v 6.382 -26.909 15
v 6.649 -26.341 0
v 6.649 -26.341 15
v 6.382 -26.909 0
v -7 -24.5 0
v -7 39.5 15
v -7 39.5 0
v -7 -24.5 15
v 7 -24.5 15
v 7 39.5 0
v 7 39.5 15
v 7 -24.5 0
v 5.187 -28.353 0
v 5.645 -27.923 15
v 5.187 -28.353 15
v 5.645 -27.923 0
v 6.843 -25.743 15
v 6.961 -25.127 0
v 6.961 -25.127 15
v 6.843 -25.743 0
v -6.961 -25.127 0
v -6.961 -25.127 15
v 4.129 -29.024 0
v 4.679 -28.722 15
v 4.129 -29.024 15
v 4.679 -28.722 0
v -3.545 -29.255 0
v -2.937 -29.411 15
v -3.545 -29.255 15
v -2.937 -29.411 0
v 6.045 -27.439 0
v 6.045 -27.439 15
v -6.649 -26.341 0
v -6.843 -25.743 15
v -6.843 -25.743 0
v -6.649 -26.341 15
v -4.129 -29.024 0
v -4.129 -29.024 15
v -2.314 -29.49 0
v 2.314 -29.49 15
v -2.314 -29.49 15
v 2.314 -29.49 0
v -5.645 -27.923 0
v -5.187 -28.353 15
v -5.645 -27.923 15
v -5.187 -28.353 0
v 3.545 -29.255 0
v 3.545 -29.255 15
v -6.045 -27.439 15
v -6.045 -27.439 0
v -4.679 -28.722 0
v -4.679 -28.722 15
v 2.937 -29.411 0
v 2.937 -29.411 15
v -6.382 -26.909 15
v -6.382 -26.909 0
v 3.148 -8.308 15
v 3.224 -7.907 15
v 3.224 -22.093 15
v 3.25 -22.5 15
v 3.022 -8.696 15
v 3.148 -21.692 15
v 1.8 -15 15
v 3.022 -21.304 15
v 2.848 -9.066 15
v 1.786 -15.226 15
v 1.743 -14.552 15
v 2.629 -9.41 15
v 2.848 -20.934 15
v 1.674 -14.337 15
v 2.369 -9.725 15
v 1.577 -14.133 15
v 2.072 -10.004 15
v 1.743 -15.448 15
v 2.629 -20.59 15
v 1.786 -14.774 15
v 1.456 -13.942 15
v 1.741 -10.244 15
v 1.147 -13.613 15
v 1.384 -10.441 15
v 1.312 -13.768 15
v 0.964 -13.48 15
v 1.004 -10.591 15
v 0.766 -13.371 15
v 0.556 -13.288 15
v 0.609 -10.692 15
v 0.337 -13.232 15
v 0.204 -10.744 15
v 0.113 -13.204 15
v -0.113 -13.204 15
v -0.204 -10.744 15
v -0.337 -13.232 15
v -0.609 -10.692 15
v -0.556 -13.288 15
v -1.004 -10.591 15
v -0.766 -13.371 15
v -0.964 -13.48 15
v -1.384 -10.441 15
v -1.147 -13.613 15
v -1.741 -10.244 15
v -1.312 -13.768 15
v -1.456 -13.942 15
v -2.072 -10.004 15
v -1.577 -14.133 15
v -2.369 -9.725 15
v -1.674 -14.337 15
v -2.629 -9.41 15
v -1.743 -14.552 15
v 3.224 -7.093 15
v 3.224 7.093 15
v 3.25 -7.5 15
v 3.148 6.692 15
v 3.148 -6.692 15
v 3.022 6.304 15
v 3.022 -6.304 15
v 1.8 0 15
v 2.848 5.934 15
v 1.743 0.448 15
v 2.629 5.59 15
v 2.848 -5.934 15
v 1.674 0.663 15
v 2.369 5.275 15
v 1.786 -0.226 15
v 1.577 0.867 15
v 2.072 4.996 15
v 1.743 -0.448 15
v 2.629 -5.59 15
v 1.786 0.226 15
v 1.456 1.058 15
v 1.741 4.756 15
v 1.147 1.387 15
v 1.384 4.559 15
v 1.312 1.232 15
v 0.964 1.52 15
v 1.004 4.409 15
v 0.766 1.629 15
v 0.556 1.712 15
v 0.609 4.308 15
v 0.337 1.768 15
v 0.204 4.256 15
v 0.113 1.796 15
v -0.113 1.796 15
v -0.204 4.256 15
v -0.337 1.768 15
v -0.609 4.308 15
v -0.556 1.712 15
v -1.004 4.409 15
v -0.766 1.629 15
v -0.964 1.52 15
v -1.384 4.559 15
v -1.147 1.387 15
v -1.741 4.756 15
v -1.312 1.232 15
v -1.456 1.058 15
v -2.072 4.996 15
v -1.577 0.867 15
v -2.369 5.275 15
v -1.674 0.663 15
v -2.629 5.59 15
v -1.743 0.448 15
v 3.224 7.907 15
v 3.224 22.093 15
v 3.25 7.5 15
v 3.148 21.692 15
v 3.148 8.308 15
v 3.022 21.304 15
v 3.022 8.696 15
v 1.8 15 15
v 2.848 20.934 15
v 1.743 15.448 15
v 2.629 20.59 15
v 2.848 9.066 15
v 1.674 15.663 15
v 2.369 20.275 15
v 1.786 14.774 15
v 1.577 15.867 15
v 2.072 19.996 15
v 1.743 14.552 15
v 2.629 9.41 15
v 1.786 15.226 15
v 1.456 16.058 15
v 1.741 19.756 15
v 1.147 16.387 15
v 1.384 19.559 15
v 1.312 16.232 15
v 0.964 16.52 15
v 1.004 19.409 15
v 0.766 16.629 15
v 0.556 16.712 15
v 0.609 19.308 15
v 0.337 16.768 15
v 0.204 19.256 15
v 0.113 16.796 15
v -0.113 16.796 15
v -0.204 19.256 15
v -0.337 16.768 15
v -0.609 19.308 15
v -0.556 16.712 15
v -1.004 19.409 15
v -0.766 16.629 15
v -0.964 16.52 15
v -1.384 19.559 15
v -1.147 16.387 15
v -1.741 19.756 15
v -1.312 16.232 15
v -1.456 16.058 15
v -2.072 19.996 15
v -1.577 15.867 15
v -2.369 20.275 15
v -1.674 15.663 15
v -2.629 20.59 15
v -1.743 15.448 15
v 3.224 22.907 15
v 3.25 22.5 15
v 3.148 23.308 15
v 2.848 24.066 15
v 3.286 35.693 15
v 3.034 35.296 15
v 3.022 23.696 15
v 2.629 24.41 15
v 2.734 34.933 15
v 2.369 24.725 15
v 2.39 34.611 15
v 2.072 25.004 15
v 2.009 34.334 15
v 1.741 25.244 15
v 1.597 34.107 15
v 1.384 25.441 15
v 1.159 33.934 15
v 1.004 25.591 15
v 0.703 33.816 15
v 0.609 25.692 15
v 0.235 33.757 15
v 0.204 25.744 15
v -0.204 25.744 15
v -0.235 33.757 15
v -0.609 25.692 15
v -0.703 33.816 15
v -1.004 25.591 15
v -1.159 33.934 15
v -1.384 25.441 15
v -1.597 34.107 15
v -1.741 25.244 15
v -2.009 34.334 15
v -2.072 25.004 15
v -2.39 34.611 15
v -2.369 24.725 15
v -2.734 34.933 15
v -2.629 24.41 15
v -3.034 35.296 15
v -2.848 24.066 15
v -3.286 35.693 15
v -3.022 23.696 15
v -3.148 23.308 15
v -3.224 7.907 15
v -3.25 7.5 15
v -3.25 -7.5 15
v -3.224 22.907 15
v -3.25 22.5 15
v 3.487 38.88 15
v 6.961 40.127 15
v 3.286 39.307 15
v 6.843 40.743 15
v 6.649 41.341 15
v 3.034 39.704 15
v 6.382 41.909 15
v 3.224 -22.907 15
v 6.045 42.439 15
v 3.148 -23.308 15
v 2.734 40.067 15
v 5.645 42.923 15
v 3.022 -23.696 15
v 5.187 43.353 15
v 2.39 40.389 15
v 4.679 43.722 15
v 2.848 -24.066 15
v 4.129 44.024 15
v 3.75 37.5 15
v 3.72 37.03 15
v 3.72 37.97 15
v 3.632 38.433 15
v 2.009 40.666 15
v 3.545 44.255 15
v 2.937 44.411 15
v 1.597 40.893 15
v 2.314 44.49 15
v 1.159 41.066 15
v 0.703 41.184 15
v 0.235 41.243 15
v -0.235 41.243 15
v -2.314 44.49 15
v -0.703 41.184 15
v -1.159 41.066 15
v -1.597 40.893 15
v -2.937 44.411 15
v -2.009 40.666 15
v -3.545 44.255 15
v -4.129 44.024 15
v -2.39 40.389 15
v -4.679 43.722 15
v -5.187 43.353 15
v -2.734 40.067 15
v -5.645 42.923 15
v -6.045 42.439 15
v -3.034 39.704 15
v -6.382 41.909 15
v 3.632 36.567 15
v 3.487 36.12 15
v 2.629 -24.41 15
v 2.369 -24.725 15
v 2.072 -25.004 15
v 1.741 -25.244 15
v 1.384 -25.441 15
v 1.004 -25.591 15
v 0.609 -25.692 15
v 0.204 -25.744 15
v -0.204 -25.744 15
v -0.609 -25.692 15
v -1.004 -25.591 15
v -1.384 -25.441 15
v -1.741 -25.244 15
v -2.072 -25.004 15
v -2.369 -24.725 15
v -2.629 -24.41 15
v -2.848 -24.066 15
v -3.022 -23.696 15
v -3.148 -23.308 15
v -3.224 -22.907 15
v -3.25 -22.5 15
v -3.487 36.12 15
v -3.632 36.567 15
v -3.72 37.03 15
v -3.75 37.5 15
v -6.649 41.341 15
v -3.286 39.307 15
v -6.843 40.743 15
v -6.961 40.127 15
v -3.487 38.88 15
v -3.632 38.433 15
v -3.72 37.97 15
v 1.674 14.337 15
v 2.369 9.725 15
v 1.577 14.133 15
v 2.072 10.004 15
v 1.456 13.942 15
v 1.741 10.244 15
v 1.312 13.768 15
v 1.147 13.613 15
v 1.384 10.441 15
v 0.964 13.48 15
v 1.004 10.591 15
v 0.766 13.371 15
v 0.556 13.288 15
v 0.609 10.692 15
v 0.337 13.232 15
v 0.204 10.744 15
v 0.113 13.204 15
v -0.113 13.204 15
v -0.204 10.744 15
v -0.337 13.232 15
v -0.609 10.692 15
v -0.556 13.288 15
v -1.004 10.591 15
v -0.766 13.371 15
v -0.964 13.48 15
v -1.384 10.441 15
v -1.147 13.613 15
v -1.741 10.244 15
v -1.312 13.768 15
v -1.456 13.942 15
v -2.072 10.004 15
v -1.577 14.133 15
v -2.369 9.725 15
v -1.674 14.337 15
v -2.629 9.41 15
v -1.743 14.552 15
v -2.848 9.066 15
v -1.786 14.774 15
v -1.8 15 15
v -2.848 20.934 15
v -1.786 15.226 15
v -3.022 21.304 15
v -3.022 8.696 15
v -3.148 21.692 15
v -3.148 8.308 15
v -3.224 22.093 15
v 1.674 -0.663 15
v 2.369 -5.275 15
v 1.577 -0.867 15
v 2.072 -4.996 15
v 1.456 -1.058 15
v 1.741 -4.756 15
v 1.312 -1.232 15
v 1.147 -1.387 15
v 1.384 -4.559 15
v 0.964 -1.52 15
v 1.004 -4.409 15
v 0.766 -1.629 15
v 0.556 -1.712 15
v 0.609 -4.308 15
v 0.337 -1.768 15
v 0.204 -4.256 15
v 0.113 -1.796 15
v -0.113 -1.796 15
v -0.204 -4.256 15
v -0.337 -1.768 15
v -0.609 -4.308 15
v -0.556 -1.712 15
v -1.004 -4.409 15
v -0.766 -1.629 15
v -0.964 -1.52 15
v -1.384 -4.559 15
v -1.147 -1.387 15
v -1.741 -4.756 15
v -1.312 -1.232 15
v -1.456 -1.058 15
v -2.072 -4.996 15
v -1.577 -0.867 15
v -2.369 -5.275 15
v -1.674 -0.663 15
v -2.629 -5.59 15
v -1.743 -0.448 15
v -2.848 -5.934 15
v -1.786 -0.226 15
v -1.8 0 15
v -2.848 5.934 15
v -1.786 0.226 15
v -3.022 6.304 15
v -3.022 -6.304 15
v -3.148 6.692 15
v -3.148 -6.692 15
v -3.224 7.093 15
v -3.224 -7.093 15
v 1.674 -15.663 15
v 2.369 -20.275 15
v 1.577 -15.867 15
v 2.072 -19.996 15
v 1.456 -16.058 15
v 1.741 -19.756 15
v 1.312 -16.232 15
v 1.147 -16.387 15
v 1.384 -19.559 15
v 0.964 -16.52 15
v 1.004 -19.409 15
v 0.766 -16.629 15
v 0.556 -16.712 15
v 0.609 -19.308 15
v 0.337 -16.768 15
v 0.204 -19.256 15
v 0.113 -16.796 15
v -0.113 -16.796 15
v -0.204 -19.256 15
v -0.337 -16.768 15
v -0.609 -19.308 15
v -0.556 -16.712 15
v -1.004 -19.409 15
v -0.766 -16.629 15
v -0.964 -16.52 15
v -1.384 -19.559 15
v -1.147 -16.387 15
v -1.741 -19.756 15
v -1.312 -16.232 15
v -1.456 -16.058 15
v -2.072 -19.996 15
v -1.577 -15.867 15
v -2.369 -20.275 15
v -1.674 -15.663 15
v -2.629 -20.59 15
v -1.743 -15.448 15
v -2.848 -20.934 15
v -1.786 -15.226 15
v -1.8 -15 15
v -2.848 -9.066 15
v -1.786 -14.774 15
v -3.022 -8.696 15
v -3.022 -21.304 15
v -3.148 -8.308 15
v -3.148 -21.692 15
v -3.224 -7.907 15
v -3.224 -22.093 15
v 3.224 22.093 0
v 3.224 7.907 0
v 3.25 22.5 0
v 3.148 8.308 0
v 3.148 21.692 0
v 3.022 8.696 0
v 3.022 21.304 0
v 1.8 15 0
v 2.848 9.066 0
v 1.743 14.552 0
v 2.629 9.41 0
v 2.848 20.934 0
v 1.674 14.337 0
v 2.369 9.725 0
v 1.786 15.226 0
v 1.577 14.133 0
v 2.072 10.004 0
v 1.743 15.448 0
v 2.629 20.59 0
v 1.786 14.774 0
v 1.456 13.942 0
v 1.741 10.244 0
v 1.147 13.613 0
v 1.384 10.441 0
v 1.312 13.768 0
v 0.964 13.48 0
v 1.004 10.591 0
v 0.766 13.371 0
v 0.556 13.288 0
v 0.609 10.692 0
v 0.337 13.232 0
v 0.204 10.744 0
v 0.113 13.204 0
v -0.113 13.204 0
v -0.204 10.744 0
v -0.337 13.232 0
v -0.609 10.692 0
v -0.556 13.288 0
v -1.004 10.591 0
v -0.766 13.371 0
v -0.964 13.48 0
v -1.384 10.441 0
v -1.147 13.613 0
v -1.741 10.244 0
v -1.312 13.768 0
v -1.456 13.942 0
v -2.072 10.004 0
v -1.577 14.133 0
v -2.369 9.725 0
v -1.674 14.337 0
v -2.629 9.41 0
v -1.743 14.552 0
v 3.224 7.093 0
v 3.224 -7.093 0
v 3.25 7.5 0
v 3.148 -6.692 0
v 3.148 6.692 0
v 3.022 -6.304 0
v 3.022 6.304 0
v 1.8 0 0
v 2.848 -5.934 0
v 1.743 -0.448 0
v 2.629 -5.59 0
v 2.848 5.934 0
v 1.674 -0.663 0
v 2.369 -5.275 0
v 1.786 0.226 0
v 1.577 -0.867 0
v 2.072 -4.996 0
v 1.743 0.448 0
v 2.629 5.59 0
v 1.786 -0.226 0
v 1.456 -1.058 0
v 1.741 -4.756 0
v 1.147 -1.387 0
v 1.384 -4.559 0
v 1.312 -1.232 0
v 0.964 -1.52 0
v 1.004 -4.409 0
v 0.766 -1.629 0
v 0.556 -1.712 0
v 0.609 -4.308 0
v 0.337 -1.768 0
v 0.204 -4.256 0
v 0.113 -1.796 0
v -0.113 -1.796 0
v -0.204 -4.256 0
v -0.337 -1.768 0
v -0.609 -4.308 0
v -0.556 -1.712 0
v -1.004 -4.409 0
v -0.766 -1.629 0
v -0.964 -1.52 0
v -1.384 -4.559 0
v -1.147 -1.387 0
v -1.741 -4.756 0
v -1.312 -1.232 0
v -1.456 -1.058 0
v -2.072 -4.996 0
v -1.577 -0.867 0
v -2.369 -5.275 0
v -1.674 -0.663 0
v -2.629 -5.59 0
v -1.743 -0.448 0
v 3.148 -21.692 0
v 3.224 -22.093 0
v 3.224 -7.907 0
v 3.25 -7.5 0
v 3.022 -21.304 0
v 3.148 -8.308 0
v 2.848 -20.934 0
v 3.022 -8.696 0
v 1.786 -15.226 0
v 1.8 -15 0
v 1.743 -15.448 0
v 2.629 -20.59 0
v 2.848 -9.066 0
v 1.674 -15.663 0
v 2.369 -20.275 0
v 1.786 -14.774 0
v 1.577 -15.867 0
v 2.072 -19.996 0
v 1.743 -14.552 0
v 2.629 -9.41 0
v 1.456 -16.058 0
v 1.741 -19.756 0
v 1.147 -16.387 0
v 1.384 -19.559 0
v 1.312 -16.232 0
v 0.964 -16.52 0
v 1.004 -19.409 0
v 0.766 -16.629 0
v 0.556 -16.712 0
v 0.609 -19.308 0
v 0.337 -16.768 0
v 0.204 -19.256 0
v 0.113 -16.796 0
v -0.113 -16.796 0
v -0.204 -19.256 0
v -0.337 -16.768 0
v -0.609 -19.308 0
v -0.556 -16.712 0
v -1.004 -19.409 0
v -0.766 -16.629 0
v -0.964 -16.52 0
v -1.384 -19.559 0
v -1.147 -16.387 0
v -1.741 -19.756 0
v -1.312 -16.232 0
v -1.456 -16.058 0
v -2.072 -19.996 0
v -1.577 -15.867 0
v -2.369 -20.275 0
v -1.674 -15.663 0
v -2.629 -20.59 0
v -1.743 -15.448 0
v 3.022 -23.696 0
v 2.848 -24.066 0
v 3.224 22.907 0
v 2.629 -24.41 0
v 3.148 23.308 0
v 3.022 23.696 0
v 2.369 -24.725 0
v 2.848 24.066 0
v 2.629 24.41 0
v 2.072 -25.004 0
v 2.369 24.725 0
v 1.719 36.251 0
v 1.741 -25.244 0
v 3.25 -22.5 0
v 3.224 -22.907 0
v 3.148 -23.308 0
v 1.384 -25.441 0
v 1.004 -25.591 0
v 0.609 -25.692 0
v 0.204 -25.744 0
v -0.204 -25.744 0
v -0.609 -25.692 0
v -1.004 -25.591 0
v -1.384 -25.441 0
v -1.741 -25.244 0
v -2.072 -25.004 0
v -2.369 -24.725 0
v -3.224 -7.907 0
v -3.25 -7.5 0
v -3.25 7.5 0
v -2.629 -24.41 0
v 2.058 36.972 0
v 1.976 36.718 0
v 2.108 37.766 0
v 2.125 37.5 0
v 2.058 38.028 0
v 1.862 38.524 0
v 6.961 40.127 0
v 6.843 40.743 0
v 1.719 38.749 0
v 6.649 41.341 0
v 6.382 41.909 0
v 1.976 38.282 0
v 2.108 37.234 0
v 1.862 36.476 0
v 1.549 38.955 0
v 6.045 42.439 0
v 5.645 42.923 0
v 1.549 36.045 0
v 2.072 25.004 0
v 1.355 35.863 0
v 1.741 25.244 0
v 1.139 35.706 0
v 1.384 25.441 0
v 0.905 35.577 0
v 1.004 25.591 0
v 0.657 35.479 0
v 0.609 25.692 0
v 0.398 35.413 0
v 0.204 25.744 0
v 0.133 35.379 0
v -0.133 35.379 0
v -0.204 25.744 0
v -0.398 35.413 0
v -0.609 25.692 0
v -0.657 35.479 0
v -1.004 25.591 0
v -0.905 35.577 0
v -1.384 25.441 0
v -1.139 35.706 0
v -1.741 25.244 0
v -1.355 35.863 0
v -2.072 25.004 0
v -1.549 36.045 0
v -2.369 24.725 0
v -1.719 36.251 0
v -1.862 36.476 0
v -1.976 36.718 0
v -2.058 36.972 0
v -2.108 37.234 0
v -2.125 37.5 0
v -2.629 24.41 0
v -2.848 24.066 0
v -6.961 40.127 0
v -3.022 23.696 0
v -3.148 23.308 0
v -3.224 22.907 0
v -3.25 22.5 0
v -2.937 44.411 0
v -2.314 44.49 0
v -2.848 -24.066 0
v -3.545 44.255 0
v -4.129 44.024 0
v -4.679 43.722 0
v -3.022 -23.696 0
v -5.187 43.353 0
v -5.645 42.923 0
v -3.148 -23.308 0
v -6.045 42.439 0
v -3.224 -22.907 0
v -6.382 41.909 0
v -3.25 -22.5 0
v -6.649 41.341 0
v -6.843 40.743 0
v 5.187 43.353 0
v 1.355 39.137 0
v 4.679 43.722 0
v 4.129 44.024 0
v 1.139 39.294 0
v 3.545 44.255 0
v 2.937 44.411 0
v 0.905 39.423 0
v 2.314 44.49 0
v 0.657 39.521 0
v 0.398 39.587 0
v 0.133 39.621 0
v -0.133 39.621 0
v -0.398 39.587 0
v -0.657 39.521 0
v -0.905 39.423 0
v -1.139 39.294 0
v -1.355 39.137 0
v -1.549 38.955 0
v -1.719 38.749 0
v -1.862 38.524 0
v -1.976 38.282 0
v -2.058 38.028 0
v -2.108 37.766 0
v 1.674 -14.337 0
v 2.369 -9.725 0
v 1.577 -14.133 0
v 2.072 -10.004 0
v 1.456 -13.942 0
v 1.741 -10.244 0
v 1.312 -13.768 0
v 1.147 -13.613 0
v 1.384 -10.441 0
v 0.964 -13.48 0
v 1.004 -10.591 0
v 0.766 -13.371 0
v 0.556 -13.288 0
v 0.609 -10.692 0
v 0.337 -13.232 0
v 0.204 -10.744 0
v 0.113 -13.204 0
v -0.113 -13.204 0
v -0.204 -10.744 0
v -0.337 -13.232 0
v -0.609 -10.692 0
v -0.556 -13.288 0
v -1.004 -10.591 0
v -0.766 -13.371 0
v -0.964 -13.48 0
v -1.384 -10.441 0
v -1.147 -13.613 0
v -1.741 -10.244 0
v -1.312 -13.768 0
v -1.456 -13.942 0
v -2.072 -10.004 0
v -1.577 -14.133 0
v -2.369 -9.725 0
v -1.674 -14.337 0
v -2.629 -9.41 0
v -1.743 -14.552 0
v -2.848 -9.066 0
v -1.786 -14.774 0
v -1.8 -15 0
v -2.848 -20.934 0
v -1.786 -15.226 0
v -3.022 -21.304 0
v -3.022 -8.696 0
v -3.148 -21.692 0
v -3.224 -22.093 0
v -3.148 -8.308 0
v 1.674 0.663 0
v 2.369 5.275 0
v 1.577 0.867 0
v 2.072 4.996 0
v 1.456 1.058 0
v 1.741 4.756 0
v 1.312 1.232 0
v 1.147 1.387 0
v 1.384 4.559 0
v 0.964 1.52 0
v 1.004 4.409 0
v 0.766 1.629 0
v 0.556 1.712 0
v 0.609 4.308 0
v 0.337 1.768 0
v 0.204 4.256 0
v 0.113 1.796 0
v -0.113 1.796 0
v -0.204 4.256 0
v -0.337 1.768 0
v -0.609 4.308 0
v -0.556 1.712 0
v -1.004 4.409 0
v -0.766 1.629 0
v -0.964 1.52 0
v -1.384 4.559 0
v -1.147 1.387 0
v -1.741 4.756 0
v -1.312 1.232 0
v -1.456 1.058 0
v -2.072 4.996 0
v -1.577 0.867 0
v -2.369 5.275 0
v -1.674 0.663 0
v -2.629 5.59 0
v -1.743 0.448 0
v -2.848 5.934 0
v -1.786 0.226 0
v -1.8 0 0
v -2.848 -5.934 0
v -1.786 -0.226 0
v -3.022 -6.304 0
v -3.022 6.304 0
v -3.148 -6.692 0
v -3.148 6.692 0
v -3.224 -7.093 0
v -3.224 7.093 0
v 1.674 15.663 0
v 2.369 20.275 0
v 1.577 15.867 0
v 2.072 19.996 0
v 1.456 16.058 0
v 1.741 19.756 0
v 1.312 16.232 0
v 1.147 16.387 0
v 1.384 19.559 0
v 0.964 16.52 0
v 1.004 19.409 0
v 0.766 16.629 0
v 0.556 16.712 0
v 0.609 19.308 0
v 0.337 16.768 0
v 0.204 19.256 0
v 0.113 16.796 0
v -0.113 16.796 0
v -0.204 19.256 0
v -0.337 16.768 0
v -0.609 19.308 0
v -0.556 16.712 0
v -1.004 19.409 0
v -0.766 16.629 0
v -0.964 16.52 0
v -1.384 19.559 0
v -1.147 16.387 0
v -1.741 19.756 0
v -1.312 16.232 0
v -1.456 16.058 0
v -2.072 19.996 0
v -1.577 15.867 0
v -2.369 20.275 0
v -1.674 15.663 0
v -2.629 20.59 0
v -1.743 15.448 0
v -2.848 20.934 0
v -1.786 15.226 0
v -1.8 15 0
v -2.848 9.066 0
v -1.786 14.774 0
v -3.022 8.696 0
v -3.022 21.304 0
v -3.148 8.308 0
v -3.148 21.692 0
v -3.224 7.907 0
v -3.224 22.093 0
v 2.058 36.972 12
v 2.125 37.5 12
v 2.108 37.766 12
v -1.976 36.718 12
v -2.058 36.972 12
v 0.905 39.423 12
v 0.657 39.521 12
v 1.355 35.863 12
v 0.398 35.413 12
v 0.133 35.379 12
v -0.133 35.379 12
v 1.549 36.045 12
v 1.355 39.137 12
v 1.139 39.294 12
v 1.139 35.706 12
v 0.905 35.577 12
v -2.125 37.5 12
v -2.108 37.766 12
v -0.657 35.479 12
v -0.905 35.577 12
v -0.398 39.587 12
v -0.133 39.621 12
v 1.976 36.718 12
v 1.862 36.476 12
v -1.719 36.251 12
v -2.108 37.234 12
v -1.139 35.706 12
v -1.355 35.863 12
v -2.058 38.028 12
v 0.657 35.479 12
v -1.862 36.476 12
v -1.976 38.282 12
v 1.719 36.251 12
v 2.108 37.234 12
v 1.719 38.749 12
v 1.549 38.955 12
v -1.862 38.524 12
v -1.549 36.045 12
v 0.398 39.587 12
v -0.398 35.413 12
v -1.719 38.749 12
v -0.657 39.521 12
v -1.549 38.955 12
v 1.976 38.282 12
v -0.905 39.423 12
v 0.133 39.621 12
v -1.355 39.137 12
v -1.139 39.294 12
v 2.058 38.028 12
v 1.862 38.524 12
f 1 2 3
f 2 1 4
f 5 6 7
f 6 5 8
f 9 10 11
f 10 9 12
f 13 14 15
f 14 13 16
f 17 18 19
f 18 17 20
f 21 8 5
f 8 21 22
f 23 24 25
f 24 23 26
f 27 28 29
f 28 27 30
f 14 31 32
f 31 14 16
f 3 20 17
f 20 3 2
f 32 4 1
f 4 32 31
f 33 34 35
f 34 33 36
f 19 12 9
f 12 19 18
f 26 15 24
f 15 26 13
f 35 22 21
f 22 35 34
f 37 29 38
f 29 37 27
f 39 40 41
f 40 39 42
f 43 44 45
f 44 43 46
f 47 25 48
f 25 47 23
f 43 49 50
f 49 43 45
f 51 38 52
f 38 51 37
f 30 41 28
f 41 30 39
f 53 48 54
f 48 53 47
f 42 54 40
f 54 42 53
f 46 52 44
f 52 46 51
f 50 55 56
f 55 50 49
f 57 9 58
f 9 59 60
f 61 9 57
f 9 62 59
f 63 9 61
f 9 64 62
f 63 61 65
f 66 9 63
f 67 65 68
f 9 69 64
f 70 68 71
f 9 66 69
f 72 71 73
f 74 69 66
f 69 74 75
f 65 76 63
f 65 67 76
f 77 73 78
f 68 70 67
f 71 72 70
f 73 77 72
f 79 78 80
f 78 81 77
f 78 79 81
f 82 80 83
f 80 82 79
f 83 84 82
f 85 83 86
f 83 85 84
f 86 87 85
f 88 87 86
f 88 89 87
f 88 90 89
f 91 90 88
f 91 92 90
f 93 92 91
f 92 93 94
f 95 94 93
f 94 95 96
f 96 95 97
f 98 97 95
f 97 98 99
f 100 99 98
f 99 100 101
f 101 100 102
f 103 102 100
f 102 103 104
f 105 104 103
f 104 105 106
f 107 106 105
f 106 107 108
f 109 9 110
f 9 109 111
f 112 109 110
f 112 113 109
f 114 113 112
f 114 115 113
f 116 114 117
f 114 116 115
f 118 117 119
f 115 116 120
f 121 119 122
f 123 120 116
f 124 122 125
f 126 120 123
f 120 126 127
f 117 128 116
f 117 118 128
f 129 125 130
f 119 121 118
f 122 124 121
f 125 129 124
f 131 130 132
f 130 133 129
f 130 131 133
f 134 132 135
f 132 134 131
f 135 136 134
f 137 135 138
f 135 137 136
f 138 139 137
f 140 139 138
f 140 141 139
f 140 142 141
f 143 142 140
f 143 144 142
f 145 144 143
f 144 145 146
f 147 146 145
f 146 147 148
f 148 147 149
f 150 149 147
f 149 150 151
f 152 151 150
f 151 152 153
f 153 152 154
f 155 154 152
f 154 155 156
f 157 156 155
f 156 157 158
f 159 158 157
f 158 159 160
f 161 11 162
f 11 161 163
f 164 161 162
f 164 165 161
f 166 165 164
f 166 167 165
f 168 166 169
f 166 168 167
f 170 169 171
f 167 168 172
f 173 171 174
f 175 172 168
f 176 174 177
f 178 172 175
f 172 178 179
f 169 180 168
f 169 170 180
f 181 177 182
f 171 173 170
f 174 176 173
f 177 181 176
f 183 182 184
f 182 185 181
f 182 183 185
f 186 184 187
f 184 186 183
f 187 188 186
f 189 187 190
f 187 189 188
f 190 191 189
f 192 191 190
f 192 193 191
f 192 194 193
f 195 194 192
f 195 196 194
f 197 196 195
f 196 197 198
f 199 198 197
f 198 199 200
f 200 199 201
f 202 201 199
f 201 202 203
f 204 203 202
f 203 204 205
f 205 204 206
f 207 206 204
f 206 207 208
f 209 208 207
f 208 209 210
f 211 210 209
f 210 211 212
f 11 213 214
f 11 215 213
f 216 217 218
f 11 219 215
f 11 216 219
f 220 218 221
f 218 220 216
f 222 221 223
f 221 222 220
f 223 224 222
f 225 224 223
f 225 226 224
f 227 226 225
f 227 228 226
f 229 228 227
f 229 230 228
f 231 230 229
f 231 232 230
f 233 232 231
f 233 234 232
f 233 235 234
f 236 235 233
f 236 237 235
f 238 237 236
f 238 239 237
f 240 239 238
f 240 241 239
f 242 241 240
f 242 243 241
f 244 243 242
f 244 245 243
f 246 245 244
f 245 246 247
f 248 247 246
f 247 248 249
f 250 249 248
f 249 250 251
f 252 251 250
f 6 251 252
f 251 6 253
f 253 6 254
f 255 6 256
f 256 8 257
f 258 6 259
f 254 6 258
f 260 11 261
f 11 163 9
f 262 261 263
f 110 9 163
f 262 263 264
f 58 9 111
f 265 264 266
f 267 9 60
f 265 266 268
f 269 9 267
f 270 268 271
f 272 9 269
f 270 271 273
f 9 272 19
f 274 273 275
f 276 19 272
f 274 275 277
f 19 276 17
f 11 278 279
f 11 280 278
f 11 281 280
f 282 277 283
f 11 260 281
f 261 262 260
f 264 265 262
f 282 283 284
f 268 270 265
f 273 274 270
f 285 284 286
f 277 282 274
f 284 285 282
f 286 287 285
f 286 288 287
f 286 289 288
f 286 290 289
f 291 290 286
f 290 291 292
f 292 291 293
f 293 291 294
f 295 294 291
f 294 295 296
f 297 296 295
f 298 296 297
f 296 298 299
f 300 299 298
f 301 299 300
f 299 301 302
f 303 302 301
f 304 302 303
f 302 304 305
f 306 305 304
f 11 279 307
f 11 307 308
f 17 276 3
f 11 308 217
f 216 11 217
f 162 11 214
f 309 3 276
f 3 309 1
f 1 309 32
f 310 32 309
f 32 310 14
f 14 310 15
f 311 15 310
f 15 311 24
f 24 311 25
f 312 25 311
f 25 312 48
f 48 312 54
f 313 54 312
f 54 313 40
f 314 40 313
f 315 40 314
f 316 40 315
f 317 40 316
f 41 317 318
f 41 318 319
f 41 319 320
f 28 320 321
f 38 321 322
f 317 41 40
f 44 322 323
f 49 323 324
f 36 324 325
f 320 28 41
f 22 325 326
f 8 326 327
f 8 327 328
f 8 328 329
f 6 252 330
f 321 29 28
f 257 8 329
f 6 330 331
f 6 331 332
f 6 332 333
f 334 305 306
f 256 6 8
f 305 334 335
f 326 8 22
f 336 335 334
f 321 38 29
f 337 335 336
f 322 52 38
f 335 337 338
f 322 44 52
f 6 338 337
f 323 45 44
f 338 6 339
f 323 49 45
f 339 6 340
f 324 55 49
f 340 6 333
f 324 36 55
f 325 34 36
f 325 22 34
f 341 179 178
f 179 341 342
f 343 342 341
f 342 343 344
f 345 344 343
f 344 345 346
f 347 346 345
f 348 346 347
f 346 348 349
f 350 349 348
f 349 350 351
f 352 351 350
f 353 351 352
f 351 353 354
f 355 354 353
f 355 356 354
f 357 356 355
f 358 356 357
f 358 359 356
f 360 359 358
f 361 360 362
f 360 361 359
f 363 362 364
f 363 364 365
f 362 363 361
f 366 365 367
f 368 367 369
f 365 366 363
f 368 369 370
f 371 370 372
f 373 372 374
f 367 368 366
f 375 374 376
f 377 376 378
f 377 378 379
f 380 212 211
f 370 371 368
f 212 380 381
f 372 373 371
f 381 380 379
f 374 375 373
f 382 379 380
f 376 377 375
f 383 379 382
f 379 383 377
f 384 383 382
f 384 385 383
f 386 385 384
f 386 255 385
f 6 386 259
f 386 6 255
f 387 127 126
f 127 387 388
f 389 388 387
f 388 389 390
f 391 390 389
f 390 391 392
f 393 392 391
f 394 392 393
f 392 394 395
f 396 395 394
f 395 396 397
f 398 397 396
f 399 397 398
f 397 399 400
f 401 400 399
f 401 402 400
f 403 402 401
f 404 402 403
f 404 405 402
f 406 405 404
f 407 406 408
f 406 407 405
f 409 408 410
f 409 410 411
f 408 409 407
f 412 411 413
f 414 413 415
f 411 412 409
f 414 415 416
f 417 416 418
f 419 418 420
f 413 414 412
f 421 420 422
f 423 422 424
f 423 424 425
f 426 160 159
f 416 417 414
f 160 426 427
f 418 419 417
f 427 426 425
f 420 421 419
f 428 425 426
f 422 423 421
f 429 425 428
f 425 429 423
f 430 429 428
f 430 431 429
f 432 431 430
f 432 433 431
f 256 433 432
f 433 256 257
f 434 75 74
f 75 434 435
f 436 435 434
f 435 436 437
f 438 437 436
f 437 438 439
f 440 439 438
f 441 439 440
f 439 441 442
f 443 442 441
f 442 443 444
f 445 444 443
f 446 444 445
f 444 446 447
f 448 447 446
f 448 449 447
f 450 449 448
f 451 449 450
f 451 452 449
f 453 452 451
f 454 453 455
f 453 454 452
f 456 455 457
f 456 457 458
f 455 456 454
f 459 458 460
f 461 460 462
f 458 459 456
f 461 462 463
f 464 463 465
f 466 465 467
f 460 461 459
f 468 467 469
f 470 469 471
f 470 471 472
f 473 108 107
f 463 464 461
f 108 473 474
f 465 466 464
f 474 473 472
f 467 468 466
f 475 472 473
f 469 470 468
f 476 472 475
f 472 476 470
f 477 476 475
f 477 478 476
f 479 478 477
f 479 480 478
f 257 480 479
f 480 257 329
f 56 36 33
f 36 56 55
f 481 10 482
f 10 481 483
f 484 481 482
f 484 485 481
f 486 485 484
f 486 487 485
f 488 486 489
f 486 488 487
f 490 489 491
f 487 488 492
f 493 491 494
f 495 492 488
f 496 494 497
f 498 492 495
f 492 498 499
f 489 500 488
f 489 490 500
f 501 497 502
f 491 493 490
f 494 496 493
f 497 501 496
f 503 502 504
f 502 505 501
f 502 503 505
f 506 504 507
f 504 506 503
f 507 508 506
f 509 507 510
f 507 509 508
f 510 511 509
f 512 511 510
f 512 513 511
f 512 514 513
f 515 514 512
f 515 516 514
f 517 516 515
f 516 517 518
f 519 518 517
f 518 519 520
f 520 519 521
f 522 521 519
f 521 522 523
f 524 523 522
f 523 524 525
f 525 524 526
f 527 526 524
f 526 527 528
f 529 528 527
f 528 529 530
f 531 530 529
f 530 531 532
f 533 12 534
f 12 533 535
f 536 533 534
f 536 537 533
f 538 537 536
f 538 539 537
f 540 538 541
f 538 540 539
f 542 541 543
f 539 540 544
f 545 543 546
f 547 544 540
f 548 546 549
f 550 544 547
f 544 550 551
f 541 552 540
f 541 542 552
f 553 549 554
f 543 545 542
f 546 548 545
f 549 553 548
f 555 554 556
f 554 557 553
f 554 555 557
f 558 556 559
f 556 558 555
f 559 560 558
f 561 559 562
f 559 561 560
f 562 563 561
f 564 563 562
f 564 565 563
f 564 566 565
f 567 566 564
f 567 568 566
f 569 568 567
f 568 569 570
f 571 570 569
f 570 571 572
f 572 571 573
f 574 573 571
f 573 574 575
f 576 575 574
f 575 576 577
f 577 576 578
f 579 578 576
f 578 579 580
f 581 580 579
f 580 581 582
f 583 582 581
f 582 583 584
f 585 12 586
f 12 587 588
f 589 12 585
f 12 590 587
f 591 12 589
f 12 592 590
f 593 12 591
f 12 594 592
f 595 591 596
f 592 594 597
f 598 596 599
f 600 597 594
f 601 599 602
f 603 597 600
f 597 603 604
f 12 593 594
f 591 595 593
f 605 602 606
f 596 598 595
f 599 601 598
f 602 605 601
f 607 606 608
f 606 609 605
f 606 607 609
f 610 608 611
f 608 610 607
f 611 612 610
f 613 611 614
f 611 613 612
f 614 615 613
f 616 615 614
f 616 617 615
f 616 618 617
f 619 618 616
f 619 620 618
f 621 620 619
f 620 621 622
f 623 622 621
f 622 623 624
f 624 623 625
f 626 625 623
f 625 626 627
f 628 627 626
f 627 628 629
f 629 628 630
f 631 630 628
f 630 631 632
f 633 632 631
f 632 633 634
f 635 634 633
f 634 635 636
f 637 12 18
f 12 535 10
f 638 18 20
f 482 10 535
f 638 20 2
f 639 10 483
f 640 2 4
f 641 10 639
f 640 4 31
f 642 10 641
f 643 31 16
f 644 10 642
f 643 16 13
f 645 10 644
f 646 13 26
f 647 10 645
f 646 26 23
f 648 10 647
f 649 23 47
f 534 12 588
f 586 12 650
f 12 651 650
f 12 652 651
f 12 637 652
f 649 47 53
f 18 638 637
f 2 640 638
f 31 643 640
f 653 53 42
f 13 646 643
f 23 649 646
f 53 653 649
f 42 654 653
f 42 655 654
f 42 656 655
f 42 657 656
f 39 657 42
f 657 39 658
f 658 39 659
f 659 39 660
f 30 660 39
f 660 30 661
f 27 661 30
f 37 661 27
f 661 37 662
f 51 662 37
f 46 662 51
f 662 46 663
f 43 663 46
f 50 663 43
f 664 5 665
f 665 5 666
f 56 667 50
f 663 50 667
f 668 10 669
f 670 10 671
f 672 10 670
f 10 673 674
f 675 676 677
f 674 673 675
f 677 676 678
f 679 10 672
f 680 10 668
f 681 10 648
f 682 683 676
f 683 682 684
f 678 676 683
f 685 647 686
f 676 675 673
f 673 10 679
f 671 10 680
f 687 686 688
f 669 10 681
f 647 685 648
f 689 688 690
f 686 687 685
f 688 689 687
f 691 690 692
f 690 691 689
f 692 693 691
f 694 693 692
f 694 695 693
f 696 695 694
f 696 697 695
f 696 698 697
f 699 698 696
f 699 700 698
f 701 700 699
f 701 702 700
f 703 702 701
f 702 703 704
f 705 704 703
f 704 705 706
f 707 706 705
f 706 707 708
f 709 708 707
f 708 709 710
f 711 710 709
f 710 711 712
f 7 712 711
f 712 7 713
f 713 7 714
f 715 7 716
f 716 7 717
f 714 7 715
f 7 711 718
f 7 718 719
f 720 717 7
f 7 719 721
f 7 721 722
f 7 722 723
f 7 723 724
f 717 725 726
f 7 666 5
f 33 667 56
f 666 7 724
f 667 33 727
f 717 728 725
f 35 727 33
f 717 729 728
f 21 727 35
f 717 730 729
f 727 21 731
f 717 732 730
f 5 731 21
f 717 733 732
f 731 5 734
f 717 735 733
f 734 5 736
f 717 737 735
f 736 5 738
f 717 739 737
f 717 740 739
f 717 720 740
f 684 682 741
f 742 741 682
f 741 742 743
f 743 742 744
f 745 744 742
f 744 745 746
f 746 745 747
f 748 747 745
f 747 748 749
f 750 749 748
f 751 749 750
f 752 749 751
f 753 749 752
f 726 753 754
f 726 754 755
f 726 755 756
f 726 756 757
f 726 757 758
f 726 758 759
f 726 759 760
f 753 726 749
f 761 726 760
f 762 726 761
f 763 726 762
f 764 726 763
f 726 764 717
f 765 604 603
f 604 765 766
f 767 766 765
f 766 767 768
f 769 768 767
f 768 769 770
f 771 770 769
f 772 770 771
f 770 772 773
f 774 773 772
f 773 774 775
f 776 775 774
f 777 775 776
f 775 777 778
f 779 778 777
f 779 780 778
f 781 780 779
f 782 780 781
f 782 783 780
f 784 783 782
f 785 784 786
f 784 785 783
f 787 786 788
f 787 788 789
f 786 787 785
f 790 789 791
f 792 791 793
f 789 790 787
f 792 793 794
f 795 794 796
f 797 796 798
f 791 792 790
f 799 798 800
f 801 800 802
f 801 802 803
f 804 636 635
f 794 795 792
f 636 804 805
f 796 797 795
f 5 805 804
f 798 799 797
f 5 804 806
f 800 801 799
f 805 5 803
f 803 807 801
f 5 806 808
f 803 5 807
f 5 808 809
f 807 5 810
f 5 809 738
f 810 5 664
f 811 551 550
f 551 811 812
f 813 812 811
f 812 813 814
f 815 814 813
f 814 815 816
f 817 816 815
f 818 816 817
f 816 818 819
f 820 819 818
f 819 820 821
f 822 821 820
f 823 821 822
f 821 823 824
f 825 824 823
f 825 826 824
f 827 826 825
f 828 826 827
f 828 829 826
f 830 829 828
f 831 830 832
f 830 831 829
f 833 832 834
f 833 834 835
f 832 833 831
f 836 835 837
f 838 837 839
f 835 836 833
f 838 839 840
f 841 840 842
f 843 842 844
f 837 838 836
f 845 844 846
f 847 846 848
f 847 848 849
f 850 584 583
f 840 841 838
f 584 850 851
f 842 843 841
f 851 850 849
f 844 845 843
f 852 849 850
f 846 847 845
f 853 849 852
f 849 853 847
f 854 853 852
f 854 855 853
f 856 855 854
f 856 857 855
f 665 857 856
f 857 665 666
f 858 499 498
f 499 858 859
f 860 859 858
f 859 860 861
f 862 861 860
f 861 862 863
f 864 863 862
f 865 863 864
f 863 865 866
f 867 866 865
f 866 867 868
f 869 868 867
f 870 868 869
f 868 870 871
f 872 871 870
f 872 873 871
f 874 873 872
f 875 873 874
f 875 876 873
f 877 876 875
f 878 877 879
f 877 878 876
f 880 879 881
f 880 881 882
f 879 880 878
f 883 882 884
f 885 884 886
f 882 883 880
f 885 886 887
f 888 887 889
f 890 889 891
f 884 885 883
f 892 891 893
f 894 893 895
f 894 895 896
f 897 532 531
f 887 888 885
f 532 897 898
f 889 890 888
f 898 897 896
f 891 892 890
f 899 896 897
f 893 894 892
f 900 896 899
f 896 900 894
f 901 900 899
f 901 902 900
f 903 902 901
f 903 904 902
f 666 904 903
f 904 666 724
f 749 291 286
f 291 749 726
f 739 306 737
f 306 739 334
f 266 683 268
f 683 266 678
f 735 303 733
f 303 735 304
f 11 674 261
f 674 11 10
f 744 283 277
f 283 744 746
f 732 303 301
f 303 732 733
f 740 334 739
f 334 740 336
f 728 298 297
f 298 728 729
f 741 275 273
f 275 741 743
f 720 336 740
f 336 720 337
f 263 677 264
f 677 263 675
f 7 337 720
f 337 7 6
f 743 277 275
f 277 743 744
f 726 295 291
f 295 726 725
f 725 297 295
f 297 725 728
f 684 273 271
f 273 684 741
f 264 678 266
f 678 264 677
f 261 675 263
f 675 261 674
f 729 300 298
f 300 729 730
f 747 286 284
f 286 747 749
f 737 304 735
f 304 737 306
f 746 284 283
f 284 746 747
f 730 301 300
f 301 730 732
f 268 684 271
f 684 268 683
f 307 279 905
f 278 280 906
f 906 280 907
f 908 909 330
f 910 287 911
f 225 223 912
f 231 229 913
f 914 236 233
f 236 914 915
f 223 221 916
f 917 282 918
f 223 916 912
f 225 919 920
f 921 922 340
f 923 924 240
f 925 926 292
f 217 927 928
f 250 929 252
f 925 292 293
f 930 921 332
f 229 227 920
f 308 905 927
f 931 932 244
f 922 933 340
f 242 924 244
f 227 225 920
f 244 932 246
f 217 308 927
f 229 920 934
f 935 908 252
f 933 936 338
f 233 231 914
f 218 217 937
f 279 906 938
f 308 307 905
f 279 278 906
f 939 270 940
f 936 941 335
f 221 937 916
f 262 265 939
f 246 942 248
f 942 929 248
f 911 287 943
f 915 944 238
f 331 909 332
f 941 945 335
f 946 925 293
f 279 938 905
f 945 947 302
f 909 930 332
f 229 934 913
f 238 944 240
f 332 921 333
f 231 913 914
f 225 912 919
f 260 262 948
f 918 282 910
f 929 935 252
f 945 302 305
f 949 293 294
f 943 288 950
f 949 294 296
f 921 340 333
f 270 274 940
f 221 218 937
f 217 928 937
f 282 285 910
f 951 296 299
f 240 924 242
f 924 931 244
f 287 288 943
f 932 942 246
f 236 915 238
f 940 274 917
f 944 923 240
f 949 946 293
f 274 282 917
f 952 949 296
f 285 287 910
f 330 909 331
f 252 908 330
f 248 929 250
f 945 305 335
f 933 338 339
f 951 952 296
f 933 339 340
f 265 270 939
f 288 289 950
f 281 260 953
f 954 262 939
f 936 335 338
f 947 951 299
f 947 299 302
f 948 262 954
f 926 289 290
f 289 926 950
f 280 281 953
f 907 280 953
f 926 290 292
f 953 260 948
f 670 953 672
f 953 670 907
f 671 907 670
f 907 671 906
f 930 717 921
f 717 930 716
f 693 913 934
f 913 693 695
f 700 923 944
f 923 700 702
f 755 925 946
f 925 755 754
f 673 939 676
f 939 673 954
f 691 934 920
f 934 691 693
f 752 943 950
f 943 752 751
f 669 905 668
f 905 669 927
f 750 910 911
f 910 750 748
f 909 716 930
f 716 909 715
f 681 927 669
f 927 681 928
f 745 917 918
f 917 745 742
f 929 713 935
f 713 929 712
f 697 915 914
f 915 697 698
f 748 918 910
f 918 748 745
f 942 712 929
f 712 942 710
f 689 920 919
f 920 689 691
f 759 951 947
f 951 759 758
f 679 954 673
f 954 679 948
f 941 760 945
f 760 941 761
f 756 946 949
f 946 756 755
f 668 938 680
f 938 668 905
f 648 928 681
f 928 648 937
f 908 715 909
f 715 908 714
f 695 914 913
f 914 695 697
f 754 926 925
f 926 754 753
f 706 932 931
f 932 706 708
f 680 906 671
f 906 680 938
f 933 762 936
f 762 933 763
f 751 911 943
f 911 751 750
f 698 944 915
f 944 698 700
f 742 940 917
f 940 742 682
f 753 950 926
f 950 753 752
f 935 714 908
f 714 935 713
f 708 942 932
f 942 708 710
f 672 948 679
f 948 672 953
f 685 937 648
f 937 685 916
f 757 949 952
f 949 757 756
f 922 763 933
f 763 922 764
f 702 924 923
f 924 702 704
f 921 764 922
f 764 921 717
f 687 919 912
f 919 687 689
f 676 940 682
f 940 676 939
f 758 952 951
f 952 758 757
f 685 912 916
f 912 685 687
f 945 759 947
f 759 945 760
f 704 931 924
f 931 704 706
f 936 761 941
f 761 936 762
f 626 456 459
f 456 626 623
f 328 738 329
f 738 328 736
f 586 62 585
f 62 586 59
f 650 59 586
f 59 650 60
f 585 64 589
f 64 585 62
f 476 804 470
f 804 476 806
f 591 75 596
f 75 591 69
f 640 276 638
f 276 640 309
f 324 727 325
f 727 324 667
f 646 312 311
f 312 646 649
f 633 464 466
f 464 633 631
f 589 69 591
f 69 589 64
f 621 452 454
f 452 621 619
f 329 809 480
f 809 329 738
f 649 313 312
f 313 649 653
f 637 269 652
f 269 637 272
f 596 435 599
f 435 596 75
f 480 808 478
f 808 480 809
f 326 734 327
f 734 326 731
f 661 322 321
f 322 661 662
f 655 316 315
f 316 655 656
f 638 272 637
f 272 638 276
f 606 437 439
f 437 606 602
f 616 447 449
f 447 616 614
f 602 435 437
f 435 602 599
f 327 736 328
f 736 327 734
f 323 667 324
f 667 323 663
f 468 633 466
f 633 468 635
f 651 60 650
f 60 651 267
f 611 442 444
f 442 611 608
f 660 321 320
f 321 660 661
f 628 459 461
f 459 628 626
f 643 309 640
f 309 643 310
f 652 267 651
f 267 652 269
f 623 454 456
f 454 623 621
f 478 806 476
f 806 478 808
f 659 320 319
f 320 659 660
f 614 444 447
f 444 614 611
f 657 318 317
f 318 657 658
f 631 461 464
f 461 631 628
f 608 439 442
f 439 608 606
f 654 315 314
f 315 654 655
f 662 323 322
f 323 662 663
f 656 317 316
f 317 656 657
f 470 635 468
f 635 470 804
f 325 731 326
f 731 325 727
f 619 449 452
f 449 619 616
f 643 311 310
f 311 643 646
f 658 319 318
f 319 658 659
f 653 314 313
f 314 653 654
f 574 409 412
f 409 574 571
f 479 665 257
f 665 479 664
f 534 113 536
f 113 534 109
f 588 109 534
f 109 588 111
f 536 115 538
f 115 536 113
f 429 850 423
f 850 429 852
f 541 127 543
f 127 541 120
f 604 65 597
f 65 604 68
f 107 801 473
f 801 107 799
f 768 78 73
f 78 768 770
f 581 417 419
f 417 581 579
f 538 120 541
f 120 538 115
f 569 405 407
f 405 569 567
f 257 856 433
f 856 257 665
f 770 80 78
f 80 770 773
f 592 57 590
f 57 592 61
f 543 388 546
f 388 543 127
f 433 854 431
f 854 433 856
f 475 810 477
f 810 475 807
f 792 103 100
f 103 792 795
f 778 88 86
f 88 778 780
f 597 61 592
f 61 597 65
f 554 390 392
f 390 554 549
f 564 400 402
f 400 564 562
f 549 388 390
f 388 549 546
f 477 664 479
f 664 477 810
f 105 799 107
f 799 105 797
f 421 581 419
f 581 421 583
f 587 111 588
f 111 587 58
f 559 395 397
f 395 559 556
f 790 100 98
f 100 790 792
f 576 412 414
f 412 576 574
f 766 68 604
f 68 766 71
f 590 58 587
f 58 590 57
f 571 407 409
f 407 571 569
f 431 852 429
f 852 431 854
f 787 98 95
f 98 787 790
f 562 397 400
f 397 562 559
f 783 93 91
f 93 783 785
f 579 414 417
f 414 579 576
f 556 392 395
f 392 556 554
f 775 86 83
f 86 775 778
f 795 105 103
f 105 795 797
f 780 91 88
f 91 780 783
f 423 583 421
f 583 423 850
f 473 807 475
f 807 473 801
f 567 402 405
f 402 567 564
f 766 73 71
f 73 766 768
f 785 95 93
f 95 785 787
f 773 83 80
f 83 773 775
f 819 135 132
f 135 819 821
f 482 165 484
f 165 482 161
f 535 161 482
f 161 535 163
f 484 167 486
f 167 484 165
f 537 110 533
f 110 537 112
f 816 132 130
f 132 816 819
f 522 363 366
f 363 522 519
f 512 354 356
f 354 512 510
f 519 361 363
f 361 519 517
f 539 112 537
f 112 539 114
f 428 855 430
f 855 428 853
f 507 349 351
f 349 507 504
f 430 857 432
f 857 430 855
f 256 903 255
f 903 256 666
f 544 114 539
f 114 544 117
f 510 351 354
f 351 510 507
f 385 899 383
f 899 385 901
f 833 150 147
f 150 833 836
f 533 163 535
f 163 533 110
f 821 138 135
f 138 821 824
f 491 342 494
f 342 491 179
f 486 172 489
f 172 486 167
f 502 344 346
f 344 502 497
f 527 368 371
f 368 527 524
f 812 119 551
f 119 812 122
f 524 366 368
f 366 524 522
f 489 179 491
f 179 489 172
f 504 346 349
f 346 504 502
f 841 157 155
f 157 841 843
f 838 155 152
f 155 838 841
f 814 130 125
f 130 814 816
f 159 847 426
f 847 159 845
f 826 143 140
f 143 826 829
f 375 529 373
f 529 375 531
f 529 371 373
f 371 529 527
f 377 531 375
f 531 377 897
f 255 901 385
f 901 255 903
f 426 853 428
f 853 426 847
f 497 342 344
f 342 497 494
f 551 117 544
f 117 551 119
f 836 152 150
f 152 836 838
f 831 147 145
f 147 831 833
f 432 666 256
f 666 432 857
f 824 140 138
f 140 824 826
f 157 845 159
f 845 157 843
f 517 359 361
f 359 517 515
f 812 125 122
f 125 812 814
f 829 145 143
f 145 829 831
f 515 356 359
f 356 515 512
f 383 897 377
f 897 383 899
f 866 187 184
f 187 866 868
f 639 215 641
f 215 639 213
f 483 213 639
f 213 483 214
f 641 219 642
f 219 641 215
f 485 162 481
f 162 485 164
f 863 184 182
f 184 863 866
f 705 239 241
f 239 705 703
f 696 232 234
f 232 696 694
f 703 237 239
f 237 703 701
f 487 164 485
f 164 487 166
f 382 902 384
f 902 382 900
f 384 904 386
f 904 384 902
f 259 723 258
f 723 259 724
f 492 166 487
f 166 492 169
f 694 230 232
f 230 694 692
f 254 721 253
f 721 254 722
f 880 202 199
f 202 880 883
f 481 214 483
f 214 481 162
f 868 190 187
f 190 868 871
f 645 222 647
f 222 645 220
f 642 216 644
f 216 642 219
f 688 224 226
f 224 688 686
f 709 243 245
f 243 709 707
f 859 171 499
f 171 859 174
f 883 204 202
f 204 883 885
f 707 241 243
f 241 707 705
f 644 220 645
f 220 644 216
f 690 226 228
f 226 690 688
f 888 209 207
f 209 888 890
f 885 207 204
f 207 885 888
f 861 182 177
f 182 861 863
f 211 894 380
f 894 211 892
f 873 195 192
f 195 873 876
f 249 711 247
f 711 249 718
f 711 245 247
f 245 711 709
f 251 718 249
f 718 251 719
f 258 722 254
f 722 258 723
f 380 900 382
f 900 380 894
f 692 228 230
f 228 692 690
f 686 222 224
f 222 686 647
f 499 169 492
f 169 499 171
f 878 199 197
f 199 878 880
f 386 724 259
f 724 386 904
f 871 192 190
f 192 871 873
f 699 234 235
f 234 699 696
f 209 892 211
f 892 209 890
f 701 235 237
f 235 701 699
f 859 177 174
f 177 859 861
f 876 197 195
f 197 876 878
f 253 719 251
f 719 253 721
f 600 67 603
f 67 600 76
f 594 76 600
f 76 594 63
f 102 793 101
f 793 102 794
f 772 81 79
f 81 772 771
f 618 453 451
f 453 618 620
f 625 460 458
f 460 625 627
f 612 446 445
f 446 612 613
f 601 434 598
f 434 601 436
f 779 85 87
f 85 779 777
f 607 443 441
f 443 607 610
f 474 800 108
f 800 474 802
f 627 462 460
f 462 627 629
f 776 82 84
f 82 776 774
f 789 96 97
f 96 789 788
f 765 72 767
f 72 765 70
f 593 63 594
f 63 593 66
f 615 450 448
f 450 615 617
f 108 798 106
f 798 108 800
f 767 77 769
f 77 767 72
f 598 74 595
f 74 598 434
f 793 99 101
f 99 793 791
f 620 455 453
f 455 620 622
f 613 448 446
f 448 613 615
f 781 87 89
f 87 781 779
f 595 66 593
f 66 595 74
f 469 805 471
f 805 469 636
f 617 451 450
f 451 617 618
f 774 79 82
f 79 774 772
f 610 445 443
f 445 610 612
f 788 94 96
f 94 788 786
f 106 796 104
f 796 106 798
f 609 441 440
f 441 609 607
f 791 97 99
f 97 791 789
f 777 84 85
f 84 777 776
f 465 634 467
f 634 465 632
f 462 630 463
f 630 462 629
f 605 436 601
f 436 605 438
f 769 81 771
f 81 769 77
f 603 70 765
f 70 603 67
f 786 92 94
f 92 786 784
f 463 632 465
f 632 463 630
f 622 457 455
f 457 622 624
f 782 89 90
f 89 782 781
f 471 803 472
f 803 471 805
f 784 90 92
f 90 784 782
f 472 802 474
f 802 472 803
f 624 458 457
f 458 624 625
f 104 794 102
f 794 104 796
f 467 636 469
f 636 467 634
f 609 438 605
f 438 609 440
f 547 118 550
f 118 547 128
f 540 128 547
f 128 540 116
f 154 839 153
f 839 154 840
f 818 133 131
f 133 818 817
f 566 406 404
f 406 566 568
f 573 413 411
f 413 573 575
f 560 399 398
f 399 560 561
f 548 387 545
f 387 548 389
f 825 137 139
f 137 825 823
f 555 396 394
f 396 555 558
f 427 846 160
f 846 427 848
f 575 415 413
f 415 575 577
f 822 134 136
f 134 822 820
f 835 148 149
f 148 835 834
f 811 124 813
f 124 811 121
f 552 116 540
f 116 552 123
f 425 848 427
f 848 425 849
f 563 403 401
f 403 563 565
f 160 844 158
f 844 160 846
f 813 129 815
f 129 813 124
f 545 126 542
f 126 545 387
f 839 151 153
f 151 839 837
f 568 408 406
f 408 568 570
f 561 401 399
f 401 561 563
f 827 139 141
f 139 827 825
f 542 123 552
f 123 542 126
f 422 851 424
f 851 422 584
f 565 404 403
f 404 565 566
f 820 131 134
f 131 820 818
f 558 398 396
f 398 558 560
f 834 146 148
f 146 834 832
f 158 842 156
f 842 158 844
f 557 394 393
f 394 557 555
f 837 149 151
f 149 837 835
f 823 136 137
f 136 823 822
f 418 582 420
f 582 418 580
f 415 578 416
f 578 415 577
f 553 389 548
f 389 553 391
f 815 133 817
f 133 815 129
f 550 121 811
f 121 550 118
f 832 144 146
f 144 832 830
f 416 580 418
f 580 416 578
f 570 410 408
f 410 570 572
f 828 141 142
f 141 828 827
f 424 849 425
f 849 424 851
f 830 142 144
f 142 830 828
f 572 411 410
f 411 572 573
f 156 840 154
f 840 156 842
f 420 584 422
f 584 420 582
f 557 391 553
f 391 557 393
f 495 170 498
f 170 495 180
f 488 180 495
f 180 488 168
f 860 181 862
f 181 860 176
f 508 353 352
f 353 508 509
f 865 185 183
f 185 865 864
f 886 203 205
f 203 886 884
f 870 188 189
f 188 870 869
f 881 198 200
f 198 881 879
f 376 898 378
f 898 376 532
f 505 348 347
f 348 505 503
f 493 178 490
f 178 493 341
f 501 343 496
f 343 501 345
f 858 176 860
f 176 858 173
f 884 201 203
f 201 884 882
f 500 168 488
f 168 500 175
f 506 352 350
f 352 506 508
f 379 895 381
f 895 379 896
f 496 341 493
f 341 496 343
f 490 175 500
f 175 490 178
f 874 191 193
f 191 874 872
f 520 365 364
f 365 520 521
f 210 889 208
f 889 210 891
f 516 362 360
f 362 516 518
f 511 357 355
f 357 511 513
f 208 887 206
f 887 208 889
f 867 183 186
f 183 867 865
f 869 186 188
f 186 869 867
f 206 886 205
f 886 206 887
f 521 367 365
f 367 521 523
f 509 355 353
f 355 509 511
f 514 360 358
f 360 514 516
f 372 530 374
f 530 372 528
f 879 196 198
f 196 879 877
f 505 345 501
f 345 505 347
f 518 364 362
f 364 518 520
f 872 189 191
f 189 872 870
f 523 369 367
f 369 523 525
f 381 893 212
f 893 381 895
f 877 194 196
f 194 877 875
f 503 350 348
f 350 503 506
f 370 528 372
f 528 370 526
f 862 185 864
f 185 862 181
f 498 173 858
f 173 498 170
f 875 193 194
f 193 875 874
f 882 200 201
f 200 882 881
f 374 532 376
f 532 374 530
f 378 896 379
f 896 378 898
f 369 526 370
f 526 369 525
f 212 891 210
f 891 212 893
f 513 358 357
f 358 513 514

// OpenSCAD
$fn = 50;


difference() {
	union() {
		hull() {
			translate(v = [-2.0000000000, 24.5000000000, 0]) {
				cylinder(h = 15, r = 5);
			}
			translate(v = [2.0000000000, 24.5000000000, 0]) {
				cylinder(h = 15, r = 5);
			}
			translate(v = [-2.0000000000, -24.5000000000, 0]) {
				cylinder(h = 15, r = 5);
			}
			translate(v = [2.0000000000, -24.5000000000, 0]) {
				cylinder(h = 15, r = 5);
			}
		}
		translate(v = [0.0000000000, 30.0000000000, 0]) {
			hull() {
				translate(v = [-2.0000000000, 9.5000000000, 0]) {
					cylinder(h = 15, r = 5);
				}
				translate(v = [2.0000000000, 9.5000000000, 0]) {
					cylinder(h = 15, r = 5);
				}
				translate(v = [-2.0000000000, -9.5000000000, 0]) {
					cylinder(h = 15, r = 5);
				}
				translate(v = [2.0000000000, -9.5000000000, 0]) {
					cylinder(h = 15, r = 5);
				}
			}
		}
		translate(v = [0.0000000000, 30.0000000000, 0]) {
			hull() {
				translate(v = [-2.0000000000, 9.5000000000, 0]) {
					cylinder(h = 15, r = 5);
				}
				translate(v = [2.0000000000, 9.5000000000, 0]) {
					cylinder(h = 15, r = 5);
				}
				translate(v = [-2.0000000000, -9.5000000000, 0]) {
					cylinder(h = 15, r = 5);
				}
				translate(v = [2.0000000000, -9.5000000000, 0]) {
					cylinder(h = 15, r = 5);
				}
			}
		}
	}
	union() {
		translate(v = [0.0000000000, 37.5000000000, 15]) {
			rotate(a = [0, 0, 0]) {
				difference() {
					union() {
						#translate(v = [0, 0, -15.0000000000]) {
							cylinder(h = 15, r = 2.0000000000);
						}
						#translate(v = [0, 0, -3]) {
							cylinder(h = 3, r1 = 2.1250000000, r2 = 3.7500000000);
						}
						#translate(v = [0, 0, -15.0000000000]) {
							cylinder(h = 15, r = 2.1250000000);
						}
						#translate(v = [0, 0, -15.0000000000]) {
							cylinder(h = 15, r = 2.0000000000);
						}
					}
					union();
				}
			}
		}
		translate(v = [0.0000000000, 37.5000000000, 15]) {
			rotate(a = [0, 0, 0]) {
				difference() {
					union() {
						#translate(v = [0, 0, -15.0000000000]) {
							cylinder(h = 15, r = 2.0000000000);
						}
						#translate(v = [0, 0, -3]) {
							cylinder(h = 3, r1 = 2.1250000000, r2 = 3.7500000000);
						}
						#translate(v = [0, 0, -15.0000000000]) {
							cylinder(h = 15, r = 2.1250000000);
						}
						#translate(v = [0, 0, -15.0000000000]) {
							cylinder(h = 15, r = 2.0000000000);
						}
					}
					union();
				}
			}
		}
		translate(v = [0.0000000000, -22.5000000000, 0]) {
			translate(v = [0, 0, -100]) {
				cylinder(h = 200, r = 3.2500000000);
			}
		}
		translate(v = [0.0000000000, -7.5000000000, 0]) {
			translate(v = [0, 0, -100]) {
				cylinder(h = 200, r = 3.2500000000);
			}
		}
		translate(v = [0.0000000000, 7.5000000000, 0]) {
			translate(v = [0, 0, -100]) {
				cylinder(h = 200, r = 3.2500000000);
			}
		}
		translate(v = [0.0000000000, 22.5000000000, 0]) {
			translate(v = [0, 0, -100]) {
				cylinder(h = 200, r = 3.2500000000);
			}
		}
		translate(v = [0.0000000000, -22.5000000000, 0]) {
			translate(v = [0, 0, -100]) {
				cylinder(h = 200, r = 1.8000000000);
			}
		}
		translate(v = [0.0000000000, -15.0000000000, 0]) {
			translate(v = [0, 0, -100]) {
				cylinder(h = 200, r = 1.8000000000);
			}
		}
		translate(v = [0.0000000000, -7.5000000000, 0]) {
			translate(v = [0, 0, -100]) {
				cylinder(h = 200, r = 1.8000000000);
			}
		}
		translate(v = [0, 0, -100]) {
			cylinder(h = 200, r = 1.8000000000);
		}
		translate(v = [0.0000000000, 7.5000000000, 0]) {
			translate(v = [0, 0, -100]) {
				cylinder(h = 200, r = 1.8000000000);
			}
		}
		translate(v = [0.0000000000, 15.0000000000, 0]) {
			translate(v = [0, 0, -100]) {
				cylinder(h = 200, r = 1.8000000000);
			}
		}
		translate(v = [0.0000000000, 22.5000000000, 0]) {
			translate(v = [0, 0, -100]) {
				cylinder(h = 200, r = 1.8000000000);
			}
		}
	}
}
